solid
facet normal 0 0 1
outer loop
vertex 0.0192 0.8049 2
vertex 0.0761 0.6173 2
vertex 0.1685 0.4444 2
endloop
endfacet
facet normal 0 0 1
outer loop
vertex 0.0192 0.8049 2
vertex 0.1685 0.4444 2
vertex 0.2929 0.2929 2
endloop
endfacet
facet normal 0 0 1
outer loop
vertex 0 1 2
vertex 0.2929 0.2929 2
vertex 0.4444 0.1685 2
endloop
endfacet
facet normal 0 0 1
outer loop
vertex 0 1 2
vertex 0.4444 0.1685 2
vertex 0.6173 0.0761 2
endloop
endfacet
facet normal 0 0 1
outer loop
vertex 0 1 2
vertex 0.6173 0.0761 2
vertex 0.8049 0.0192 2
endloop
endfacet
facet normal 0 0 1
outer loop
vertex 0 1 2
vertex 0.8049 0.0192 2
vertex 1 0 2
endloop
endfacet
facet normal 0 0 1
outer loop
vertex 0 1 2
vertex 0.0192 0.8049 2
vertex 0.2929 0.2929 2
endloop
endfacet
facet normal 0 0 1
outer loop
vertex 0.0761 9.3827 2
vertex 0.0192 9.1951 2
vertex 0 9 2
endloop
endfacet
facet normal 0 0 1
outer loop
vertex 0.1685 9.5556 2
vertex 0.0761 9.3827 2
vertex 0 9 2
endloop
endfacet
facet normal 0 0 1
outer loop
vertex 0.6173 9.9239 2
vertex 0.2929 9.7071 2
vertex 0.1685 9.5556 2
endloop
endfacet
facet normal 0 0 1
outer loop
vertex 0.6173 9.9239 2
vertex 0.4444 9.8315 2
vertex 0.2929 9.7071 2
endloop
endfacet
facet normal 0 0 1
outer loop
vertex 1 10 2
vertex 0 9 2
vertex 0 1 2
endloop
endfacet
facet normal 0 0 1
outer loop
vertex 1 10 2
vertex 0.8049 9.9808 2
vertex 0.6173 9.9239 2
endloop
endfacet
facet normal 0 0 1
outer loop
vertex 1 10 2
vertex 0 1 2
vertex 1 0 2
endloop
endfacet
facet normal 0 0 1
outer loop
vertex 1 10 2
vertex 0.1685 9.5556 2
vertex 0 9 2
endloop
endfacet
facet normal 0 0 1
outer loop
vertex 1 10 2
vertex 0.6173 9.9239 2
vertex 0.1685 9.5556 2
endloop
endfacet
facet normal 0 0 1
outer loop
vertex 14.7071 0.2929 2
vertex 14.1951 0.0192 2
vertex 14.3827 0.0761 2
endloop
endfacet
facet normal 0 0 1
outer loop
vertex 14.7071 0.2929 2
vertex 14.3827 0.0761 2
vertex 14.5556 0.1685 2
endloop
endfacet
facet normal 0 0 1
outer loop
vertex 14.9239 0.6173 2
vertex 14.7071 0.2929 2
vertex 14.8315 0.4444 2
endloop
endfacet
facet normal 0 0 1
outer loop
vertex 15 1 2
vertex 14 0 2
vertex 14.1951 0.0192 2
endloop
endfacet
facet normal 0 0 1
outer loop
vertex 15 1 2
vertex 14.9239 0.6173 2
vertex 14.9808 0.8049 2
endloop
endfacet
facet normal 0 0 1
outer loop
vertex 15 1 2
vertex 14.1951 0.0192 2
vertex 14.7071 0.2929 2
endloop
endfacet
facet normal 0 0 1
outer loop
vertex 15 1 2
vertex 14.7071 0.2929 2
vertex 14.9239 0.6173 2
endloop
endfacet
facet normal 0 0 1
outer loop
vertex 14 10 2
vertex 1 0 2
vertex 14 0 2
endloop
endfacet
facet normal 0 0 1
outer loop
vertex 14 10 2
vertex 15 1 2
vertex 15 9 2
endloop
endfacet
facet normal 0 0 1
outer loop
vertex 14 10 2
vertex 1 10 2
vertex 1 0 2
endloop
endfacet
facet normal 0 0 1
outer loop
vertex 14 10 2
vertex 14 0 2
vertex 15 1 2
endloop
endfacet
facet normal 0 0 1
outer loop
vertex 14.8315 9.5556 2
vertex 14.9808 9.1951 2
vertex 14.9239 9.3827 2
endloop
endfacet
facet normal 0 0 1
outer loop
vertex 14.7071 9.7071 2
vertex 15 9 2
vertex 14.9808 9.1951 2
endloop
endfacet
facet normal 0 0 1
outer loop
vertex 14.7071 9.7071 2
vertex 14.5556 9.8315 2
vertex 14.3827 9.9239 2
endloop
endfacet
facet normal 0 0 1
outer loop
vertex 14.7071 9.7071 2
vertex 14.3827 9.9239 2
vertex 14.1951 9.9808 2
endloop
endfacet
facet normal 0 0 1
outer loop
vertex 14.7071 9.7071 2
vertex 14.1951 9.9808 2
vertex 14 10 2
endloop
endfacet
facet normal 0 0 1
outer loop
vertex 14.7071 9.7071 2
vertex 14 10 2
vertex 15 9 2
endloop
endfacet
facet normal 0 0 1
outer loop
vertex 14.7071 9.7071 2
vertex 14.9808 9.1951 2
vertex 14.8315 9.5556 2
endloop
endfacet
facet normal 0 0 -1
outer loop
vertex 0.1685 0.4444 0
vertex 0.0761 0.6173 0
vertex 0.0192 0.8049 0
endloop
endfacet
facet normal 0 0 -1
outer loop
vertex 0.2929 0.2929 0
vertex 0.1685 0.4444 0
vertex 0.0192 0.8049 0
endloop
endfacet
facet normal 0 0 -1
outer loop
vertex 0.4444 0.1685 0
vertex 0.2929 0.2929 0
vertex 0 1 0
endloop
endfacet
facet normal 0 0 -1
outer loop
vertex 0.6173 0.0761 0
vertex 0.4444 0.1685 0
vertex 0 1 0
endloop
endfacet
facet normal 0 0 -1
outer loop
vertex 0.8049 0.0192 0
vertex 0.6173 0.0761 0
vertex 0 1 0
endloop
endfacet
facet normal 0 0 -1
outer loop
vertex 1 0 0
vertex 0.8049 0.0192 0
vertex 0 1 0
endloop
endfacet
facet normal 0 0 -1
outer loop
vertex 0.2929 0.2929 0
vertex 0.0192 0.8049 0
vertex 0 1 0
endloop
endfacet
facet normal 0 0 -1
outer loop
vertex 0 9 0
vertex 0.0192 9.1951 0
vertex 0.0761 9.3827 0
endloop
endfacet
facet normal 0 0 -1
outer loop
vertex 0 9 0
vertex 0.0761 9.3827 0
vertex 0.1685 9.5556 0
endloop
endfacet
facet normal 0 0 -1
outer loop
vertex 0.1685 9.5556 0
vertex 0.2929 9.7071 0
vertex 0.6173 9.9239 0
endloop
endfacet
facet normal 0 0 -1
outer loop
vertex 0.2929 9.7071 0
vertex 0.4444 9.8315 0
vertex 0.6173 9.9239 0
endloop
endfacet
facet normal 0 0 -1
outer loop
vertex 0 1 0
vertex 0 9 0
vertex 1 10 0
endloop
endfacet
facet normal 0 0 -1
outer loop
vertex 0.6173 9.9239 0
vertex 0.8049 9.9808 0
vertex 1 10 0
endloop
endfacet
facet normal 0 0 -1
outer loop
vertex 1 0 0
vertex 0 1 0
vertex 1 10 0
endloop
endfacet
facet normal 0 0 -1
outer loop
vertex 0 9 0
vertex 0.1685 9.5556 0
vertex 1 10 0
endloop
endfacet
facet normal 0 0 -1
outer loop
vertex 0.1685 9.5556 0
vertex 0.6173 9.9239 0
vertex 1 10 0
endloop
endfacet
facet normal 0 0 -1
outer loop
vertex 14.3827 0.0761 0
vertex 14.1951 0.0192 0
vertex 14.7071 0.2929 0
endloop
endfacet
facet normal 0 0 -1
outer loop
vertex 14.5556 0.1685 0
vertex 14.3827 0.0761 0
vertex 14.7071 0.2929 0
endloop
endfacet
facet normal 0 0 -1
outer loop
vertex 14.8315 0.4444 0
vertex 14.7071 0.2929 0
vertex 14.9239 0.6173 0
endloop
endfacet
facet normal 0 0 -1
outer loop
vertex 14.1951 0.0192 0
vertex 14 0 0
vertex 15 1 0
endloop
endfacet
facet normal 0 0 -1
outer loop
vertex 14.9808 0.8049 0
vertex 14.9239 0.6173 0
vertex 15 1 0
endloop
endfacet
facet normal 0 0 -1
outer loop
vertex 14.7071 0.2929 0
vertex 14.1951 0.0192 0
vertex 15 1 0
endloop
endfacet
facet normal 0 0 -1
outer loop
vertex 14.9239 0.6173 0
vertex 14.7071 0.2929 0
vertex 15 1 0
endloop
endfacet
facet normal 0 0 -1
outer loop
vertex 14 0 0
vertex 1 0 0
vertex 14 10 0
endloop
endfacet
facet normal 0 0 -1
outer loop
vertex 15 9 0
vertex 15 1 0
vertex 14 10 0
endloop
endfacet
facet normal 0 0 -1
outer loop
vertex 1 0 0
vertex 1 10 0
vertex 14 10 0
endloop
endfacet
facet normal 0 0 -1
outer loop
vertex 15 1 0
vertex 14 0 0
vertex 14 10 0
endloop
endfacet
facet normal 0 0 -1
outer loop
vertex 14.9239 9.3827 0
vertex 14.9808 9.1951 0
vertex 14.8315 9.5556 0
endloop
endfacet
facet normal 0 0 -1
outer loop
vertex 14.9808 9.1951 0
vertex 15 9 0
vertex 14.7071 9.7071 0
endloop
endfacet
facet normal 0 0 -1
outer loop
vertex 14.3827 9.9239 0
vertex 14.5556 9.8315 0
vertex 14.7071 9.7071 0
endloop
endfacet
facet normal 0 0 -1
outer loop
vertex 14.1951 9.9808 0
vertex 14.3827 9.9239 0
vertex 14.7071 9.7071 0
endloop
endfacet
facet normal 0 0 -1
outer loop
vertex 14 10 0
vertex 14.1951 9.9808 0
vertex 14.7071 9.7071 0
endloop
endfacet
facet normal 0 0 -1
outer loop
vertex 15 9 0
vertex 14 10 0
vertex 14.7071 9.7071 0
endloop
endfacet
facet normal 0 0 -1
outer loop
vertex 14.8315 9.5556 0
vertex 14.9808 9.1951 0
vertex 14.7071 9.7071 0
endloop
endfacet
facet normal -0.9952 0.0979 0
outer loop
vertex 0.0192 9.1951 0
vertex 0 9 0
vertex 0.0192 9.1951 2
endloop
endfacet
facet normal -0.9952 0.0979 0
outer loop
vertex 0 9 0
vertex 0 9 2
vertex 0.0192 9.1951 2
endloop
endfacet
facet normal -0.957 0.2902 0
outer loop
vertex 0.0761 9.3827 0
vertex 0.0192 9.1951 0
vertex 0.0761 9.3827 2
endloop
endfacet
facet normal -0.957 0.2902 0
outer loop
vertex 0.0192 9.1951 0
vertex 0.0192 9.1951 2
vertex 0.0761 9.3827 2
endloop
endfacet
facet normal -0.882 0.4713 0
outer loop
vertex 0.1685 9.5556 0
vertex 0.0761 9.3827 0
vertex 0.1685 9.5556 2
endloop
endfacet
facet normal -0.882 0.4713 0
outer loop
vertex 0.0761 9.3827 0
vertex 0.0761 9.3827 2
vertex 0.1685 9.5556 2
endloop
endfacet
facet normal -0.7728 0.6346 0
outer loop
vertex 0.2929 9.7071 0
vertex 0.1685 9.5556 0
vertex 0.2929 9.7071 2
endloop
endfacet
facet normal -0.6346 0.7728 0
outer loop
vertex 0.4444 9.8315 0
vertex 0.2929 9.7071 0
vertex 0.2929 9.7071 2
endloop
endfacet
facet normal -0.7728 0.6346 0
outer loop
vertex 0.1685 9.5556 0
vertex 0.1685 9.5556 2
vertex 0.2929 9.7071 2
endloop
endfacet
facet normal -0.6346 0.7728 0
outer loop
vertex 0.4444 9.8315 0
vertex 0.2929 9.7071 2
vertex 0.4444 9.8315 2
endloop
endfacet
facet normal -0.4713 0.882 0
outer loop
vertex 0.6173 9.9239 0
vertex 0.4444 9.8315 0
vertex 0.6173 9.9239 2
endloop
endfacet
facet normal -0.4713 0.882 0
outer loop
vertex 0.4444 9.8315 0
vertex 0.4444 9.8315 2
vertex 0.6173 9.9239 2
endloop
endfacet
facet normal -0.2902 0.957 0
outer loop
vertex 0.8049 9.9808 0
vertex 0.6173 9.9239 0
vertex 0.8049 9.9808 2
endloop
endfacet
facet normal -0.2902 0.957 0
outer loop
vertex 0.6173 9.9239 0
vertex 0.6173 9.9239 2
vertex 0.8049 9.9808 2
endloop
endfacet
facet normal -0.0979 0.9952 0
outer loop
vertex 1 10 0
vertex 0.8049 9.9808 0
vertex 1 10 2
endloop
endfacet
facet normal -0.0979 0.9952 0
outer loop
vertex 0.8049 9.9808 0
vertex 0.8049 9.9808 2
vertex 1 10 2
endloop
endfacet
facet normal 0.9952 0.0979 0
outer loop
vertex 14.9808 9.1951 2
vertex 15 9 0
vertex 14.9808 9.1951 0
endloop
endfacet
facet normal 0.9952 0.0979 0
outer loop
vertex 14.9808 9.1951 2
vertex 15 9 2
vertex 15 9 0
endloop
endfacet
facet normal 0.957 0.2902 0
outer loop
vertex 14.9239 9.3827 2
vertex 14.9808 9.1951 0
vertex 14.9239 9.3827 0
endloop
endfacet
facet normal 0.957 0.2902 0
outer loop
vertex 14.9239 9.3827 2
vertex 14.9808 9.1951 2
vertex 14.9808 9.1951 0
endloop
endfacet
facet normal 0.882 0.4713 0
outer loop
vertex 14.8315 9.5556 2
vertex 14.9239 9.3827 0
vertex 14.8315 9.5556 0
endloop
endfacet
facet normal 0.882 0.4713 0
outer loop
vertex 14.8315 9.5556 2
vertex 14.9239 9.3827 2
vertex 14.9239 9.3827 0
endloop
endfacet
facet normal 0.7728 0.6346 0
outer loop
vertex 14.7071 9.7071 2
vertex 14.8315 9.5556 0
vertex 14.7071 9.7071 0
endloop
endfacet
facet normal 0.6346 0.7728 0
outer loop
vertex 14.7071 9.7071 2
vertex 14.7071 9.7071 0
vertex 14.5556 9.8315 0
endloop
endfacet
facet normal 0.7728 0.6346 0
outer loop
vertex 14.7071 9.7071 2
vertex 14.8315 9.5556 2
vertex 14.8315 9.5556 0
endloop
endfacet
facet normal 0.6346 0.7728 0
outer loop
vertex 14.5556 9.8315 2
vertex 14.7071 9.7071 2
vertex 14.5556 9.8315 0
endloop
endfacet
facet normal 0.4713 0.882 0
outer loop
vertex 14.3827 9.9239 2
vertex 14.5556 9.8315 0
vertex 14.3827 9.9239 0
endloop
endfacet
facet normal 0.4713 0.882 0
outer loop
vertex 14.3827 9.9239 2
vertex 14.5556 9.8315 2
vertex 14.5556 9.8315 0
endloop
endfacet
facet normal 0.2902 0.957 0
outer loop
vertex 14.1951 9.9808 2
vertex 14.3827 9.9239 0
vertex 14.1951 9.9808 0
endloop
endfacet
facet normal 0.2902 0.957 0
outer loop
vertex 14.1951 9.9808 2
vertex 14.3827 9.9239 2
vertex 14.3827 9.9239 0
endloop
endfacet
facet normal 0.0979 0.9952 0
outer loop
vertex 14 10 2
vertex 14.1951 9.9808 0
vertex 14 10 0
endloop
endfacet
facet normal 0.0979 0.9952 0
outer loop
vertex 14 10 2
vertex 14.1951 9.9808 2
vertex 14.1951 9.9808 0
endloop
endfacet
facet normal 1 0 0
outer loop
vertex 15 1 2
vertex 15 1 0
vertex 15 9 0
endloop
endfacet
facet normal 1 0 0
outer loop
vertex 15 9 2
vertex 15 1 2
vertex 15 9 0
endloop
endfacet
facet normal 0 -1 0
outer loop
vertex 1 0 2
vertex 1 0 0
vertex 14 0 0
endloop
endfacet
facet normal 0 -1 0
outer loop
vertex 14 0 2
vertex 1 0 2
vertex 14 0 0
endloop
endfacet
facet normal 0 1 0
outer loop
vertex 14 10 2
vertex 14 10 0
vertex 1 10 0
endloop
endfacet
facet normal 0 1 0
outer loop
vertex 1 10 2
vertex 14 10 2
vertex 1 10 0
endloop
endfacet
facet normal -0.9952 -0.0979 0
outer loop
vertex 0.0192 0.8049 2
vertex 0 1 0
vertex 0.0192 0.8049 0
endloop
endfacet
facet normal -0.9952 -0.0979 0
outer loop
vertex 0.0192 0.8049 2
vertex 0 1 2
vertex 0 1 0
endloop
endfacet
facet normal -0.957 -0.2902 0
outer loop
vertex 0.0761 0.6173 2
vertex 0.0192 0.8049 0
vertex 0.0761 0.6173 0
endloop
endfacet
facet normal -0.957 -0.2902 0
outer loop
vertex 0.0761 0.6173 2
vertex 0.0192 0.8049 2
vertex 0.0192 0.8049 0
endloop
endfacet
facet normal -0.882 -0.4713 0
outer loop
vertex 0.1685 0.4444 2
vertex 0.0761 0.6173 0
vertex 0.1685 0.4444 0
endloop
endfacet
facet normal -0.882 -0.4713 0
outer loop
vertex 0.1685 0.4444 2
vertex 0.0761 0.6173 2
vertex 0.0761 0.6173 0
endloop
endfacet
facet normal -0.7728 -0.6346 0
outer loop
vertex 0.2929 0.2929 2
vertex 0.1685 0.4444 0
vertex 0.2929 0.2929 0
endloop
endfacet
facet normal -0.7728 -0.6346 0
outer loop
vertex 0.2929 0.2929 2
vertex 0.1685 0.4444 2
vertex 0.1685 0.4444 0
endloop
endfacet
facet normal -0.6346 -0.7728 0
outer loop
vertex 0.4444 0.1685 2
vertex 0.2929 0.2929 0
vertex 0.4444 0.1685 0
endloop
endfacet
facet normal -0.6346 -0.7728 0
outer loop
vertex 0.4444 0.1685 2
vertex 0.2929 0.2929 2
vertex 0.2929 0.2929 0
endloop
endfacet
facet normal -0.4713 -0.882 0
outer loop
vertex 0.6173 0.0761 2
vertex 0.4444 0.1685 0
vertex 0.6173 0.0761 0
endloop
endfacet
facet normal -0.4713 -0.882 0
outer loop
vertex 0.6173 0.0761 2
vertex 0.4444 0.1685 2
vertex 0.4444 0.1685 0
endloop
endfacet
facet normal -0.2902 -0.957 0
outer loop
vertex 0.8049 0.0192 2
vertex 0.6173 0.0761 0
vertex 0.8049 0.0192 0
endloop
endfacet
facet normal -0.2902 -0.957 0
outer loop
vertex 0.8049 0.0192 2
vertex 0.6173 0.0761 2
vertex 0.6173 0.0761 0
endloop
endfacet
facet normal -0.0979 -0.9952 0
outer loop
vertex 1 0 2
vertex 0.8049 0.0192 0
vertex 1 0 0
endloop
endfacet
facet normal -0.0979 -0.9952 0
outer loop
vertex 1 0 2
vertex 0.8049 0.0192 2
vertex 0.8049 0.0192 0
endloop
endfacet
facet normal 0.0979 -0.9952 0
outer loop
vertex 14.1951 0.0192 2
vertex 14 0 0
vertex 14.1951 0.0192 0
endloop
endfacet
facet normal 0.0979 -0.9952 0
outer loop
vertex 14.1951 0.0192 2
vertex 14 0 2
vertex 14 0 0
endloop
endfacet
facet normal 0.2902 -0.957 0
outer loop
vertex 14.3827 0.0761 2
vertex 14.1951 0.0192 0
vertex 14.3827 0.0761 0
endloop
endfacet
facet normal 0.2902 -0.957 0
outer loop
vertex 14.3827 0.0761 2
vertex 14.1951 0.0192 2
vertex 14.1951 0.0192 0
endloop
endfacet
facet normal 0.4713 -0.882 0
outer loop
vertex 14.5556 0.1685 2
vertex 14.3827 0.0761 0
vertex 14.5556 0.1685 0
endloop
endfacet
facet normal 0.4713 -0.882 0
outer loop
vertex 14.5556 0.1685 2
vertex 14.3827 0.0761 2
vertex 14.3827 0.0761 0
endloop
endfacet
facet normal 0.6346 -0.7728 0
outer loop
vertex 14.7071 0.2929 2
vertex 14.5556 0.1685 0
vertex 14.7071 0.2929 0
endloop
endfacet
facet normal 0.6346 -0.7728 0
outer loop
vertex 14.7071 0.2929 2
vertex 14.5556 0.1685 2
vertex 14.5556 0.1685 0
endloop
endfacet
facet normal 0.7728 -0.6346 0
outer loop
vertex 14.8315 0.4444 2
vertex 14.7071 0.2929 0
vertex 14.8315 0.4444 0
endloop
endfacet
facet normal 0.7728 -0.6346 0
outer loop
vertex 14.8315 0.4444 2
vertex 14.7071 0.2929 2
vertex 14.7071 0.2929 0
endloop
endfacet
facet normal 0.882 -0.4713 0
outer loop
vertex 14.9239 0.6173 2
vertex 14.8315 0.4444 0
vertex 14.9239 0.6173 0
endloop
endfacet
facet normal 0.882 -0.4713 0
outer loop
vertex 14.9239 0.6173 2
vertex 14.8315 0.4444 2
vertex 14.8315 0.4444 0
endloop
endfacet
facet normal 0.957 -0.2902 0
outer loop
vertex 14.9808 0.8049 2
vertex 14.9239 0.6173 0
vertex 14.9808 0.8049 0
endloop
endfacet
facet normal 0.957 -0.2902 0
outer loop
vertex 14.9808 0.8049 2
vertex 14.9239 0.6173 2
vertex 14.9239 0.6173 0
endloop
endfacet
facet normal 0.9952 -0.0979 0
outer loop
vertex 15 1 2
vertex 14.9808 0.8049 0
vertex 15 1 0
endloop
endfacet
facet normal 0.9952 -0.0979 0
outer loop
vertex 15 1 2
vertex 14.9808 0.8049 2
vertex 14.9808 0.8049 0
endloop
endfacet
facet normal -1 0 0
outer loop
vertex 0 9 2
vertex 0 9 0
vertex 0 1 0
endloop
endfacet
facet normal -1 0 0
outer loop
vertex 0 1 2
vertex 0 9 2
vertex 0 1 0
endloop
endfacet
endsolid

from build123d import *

# Parameters (mm, degrees)
BOSS_EXTRUDE2_DEPTH = 2
FILLET1_R           = 1


with BuildPart() as part:
    # Sketch1 → Boss-Extrude2 (new body)
    with BuildSketch(Plane.XY):
        Polygon((0, 10), (0, 0), (15, 0), (15, 3.9872583), (15, 6.25), (15, 10), align=None)
    extrude(amount=BOSS_EXTRUDE2_DEPTH)

    # Fillet1
    fillet1_edges = [part.edges().sort_by_distance(p)[0] for p in [
        (0, 0, 1),
        (0, 10, 1),
        (15, 10, 1),
        (15, 0, 1),
    ]]
    fillet(fillet1_edges, radius=FILLET1_R)


solid = part.part
